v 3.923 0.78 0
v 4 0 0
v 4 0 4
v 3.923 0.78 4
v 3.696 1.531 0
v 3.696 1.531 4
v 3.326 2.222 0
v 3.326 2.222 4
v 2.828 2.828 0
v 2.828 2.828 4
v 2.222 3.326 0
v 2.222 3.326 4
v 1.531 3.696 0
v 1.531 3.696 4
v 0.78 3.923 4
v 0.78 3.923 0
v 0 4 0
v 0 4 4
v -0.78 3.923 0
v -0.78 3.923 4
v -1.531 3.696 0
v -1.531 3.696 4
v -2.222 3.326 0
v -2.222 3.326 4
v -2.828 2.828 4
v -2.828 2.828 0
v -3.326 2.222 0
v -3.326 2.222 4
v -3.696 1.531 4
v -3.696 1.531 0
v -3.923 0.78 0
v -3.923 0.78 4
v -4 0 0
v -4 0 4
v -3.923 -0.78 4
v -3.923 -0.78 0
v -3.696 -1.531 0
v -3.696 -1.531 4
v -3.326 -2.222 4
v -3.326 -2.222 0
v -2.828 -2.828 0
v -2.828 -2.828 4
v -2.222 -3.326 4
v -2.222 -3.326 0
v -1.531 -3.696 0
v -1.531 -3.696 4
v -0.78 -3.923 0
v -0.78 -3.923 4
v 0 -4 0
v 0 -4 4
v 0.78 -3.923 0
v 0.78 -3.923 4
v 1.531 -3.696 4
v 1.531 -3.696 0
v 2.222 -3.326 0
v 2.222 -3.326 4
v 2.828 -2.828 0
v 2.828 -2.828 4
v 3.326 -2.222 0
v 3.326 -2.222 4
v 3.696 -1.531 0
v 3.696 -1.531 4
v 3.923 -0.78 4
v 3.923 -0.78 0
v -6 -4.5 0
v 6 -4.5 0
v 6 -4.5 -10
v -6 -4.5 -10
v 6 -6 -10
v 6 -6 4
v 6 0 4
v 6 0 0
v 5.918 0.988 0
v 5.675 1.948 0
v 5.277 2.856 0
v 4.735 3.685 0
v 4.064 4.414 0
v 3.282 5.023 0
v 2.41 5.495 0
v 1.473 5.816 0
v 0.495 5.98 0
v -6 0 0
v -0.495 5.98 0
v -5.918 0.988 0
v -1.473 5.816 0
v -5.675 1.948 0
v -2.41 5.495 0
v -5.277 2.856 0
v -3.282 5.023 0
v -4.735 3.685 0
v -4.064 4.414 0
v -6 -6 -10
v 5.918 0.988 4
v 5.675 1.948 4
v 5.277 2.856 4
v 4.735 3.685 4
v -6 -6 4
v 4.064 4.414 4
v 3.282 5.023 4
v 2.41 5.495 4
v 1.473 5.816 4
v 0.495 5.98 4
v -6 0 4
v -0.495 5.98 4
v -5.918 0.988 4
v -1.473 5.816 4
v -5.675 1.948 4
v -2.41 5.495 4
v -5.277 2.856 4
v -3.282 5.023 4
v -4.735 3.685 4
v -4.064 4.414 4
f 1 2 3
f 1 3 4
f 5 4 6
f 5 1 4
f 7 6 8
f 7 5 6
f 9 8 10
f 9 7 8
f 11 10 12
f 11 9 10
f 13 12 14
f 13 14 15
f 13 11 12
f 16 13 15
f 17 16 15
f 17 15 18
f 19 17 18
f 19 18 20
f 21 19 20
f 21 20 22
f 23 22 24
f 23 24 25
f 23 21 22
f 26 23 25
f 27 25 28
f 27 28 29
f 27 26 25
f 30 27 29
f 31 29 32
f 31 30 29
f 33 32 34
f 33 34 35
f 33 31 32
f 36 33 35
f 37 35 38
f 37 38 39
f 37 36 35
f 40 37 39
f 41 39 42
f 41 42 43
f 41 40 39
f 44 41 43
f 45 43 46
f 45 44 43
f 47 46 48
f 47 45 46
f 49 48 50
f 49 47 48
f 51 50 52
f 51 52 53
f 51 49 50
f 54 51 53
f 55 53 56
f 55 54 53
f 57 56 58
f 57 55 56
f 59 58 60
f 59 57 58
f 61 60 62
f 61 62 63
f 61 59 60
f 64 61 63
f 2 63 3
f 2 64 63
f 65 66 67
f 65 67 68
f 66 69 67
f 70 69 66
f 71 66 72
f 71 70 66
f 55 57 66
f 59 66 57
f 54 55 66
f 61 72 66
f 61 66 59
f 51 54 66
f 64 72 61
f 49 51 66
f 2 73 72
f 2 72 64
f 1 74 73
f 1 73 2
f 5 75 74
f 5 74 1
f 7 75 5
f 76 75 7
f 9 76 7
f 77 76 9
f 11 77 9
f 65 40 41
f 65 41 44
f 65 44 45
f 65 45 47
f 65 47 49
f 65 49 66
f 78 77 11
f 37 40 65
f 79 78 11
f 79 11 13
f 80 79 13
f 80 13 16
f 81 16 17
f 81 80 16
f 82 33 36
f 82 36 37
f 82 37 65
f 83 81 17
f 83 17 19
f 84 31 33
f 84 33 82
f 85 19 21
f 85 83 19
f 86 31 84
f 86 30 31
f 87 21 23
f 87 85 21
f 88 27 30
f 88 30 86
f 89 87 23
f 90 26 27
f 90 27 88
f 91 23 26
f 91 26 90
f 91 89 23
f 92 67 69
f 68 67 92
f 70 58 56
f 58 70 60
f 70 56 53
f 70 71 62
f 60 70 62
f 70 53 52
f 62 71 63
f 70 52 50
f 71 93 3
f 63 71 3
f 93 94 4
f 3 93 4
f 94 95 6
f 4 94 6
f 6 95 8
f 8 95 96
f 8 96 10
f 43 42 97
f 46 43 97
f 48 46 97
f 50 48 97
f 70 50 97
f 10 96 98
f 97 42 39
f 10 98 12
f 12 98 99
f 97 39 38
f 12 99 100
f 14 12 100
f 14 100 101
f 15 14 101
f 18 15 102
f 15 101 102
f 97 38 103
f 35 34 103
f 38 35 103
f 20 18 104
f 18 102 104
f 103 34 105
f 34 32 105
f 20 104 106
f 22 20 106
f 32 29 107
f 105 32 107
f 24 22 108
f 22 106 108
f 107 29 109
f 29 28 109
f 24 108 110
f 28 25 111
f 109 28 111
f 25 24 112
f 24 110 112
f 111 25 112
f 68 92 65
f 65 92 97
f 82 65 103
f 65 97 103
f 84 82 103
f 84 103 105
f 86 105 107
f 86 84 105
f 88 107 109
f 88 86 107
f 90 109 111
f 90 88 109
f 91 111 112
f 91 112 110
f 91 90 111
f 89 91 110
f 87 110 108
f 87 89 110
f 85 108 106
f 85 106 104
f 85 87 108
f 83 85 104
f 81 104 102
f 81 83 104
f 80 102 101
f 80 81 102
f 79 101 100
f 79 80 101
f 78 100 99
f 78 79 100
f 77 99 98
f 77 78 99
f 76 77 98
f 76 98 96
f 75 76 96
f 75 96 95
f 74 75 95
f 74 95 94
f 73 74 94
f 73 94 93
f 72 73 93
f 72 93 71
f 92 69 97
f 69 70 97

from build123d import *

# Parameters (mm, degrees)
SKETCH1_R           = 4
BOSS_EXTRUDE1_DEPTH = 4
SKETCH2_W           = 12
SKETCH2_H           = 1.5
BOSS_EXTRUDE2_DEPTH = 10


with BuildPart() as part:
    # Sketch1 → Boss-Extrude1 (new body)
    with BuildSketch(Plane.XY):
        with BuildLine():
            Line((0, -6), (-6, -6))
            Line((-6, -6), (-6, 0))
            ThreePointArc((-6, 0), (0, 6), (6, 0))
            Line((6, 0), (6, -6))
            Line((6, -6), (0, -6))
        make_face()
        Circle(SKETCH1_R, mode=Mode.SUBTRACT)
    extrude(amount=BOSS_EXTRUDE1_DEPTH)

    # Sketch2 → Boss-Extrude2 (add)
    with BuildSketch(Plane(origin=(0, 0, 0), x_dir=(-1, 0, 0), z_dir=(0, 0, -1))):
        with Locations((0, -5.25)):
            Rectangle(SKETCH2_W, SKETCH2_H)
    extrude(amount=BOSS_EXTRUDE2_DEPTH)


solid = part.part
